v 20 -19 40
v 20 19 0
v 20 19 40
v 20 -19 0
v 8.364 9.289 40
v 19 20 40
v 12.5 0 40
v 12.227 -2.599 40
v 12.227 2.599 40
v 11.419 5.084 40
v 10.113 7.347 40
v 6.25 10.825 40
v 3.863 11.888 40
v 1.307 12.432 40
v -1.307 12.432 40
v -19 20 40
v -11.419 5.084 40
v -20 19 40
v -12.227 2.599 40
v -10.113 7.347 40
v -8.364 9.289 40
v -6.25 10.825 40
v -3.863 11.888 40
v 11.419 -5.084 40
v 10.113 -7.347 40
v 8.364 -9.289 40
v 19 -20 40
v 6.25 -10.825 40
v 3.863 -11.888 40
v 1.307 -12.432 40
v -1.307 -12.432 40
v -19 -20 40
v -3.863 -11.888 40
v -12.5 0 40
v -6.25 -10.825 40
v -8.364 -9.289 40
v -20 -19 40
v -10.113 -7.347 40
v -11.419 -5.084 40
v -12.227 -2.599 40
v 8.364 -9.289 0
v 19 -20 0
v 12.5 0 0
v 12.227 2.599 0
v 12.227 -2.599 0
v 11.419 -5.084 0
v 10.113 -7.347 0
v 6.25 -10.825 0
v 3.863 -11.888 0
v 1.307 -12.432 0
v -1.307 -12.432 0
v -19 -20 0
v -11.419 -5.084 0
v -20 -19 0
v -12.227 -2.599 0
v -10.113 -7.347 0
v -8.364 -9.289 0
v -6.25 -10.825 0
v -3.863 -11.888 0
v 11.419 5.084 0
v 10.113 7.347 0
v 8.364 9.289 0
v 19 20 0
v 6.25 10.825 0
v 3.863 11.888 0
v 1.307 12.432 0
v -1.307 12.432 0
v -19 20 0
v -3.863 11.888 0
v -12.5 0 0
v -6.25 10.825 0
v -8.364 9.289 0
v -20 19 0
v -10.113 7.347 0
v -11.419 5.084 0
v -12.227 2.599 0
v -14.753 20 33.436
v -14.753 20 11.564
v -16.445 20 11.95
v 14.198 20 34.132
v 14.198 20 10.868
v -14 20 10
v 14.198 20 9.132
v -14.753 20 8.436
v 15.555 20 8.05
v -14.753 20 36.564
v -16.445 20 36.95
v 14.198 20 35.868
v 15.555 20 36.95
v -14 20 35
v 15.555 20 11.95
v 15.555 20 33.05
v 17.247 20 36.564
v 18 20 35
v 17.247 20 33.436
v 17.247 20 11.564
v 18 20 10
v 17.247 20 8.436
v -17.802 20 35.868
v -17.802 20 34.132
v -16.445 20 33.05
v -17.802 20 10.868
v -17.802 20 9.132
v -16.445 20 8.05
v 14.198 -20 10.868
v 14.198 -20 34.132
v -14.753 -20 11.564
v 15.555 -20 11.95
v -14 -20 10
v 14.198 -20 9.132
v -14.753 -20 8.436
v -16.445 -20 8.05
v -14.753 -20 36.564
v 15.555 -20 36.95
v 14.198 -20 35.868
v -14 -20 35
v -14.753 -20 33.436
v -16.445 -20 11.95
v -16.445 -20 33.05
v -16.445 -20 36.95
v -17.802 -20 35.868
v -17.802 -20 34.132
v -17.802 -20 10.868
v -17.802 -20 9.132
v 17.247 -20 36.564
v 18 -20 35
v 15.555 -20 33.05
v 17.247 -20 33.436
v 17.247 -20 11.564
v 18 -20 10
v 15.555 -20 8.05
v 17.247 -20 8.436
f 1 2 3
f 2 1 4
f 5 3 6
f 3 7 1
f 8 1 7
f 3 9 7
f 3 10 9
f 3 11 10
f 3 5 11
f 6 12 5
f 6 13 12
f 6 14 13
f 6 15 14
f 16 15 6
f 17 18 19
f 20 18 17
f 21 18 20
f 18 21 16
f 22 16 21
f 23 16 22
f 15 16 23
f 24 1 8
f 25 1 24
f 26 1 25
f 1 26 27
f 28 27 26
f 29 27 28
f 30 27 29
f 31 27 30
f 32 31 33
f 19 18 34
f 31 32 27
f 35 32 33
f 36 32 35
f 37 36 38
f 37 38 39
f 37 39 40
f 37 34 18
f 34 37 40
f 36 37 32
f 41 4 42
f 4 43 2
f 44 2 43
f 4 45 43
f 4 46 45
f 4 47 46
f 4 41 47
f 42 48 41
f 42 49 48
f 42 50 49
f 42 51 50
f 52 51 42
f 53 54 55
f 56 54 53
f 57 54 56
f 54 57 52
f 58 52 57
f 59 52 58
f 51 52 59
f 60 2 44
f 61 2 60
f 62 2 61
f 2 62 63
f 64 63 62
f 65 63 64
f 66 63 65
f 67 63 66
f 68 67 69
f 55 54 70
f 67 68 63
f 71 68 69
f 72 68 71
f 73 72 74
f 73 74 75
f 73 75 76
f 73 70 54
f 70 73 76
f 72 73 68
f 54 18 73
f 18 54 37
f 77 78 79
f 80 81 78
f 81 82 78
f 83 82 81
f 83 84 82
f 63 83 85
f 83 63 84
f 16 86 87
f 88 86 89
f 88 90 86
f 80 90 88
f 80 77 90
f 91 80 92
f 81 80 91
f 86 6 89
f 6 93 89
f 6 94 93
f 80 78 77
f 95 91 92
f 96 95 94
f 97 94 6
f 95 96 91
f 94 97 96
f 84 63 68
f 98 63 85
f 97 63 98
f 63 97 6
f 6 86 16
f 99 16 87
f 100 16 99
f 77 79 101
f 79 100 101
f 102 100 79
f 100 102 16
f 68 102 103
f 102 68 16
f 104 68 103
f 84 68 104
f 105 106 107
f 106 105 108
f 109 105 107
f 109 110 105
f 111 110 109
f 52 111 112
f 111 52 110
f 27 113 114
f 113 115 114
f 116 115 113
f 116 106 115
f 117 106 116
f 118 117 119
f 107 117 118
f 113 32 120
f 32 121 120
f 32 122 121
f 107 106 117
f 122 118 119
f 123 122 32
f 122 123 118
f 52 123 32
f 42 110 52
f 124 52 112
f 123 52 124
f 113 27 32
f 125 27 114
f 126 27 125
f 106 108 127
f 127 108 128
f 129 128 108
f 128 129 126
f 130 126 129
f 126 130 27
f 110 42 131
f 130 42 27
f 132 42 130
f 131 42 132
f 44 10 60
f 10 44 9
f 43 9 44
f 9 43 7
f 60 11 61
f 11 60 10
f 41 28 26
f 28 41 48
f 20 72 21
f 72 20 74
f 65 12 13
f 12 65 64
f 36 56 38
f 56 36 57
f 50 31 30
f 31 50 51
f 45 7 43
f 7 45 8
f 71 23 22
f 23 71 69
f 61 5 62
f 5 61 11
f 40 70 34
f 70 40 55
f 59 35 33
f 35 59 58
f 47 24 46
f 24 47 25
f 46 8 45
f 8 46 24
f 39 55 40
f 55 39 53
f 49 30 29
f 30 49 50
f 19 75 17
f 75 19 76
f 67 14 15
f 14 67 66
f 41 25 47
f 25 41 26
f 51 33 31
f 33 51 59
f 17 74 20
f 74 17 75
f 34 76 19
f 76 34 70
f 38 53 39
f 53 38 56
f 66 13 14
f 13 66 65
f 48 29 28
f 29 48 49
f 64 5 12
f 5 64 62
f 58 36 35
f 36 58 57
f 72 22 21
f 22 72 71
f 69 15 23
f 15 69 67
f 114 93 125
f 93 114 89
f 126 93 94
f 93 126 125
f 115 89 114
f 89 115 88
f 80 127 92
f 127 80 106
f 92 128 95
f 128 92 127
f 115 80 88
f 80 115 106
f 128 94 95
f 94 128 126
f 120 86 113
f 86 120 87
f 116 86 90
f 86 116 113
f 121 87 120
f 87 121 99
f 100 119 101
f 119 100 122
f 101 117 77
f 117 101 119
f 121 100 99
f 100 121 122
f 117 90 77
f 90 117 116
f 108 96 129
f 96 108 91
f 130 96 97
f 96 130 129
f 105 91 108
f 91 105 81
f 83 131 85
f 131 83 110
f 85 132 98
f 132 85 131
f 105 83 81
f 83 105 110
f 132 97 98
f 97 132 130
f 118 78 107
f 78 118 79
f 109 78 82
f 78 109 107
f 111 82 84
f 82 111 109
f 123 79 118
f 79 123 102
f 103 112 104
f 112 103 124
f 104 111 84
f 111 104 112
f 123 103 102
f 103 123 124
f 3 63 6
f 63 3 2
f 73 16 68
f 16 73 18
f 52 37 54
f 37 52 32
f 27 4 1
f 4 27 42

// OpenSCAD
// file: ../Parameters.scad
//Main tube diameter [mm]
main_tube_outer_diameter = 25;
main_tube_inner_diameter = 21;

//Tube for undercarriage [mm]
tube_for_undercarriage_outer_diameter = 10;
tube_for_undercarriage_inner_diameter = 5;

//Screw diameter in model 666_1019 [mm]
M4_screw_diameter=4;


//Screw diameter in model 666_1004 [mm]
M3_screw_diameter = 3.2;

//Nut in model 666_1004 [mm]
Nut_height = 2.4;
Nut_diameter = 6.05;
// main file
include <../Parameters.scad>

radius=main_tube_outer_diameter/2;
wall_thickness=main_tube_outer_diameter/(10/3);
width=main_tube_outer_diameter+2*wall_thickness;	
depth=width;
height=width;


c_na_druhou=width*width+width*width;
uhlopricka=sqrt(c_na_druhou);



M4_screw_radius=M4_screw_diameter/2;
wall_thickness_M4_cylinder_X = M4_screw_radius;
stred_M4_cylinder_X = width/2 - M4_screw_radius * 2;
stred_M4_cylinder_Z_horni = height - M4_screw_radius - M4_screw_diameter*0.75;
stred_M4_cylinder_Z_dolni = M4_screw_radius + M4_screw_diameter*2;

difference (){

translate([-(width/2),-(depth/2),0])
cube ([width,depth,height]);
	
	cylinder(h=height,r1=radius,r2=radius);


	translate([stred_M4_cylinder_X,depth/2,stred_M4_cylinder_Z_horni])
	rotate([90,0,0])
	cylinder(h=height,r1=M4_screw_radius,r2=M4_screw_radius);

	translate([-(stred_M4_cylinder_X),depth/2,stred_M4_cylinder_Z_horni])
	rotate([90,0,0])
	cylinder(h=height,r1=M4_screw_radius,r2=M4_screw_radius);

	translate([stred_M4_cylinder_X,depth/2,stred_M4_cylinder_Z_dolni])
	rotate([90,0,0])
	cylinder(h=height,r1=M4_screw_radius,r2=M4_screw_radius);

	translate([-(stred_M4_cylinder_X),depth/2,stred_M4_cylinder_Z_dolni])
	rotate([90,0,0])
	cylinder(h=height,r1=M4_screw_radius,r2=M4_screw_radius);


	translate([width/2,depth/2-1,0])
	rotate([0,0,45])
	cube([uhlopricka/2,uhlopricka/2,height]);

	translate([-(width/2),depth/2-1,0])
	rotate([0,0,45])
	cube([uhlopricka/2,uhlopricka/2,height]);

	translate([-(width/2),-(depth/2+uhlopricka/2-1),0])
	rotate([0,0,45])
	cube([width/2,depth/2,height]);

	translate([(width/2),-(depth/2+uhlopricka/2-1),0])
	rotate([0,0,45])
	cube([width/2,depth/2,height]);
}
